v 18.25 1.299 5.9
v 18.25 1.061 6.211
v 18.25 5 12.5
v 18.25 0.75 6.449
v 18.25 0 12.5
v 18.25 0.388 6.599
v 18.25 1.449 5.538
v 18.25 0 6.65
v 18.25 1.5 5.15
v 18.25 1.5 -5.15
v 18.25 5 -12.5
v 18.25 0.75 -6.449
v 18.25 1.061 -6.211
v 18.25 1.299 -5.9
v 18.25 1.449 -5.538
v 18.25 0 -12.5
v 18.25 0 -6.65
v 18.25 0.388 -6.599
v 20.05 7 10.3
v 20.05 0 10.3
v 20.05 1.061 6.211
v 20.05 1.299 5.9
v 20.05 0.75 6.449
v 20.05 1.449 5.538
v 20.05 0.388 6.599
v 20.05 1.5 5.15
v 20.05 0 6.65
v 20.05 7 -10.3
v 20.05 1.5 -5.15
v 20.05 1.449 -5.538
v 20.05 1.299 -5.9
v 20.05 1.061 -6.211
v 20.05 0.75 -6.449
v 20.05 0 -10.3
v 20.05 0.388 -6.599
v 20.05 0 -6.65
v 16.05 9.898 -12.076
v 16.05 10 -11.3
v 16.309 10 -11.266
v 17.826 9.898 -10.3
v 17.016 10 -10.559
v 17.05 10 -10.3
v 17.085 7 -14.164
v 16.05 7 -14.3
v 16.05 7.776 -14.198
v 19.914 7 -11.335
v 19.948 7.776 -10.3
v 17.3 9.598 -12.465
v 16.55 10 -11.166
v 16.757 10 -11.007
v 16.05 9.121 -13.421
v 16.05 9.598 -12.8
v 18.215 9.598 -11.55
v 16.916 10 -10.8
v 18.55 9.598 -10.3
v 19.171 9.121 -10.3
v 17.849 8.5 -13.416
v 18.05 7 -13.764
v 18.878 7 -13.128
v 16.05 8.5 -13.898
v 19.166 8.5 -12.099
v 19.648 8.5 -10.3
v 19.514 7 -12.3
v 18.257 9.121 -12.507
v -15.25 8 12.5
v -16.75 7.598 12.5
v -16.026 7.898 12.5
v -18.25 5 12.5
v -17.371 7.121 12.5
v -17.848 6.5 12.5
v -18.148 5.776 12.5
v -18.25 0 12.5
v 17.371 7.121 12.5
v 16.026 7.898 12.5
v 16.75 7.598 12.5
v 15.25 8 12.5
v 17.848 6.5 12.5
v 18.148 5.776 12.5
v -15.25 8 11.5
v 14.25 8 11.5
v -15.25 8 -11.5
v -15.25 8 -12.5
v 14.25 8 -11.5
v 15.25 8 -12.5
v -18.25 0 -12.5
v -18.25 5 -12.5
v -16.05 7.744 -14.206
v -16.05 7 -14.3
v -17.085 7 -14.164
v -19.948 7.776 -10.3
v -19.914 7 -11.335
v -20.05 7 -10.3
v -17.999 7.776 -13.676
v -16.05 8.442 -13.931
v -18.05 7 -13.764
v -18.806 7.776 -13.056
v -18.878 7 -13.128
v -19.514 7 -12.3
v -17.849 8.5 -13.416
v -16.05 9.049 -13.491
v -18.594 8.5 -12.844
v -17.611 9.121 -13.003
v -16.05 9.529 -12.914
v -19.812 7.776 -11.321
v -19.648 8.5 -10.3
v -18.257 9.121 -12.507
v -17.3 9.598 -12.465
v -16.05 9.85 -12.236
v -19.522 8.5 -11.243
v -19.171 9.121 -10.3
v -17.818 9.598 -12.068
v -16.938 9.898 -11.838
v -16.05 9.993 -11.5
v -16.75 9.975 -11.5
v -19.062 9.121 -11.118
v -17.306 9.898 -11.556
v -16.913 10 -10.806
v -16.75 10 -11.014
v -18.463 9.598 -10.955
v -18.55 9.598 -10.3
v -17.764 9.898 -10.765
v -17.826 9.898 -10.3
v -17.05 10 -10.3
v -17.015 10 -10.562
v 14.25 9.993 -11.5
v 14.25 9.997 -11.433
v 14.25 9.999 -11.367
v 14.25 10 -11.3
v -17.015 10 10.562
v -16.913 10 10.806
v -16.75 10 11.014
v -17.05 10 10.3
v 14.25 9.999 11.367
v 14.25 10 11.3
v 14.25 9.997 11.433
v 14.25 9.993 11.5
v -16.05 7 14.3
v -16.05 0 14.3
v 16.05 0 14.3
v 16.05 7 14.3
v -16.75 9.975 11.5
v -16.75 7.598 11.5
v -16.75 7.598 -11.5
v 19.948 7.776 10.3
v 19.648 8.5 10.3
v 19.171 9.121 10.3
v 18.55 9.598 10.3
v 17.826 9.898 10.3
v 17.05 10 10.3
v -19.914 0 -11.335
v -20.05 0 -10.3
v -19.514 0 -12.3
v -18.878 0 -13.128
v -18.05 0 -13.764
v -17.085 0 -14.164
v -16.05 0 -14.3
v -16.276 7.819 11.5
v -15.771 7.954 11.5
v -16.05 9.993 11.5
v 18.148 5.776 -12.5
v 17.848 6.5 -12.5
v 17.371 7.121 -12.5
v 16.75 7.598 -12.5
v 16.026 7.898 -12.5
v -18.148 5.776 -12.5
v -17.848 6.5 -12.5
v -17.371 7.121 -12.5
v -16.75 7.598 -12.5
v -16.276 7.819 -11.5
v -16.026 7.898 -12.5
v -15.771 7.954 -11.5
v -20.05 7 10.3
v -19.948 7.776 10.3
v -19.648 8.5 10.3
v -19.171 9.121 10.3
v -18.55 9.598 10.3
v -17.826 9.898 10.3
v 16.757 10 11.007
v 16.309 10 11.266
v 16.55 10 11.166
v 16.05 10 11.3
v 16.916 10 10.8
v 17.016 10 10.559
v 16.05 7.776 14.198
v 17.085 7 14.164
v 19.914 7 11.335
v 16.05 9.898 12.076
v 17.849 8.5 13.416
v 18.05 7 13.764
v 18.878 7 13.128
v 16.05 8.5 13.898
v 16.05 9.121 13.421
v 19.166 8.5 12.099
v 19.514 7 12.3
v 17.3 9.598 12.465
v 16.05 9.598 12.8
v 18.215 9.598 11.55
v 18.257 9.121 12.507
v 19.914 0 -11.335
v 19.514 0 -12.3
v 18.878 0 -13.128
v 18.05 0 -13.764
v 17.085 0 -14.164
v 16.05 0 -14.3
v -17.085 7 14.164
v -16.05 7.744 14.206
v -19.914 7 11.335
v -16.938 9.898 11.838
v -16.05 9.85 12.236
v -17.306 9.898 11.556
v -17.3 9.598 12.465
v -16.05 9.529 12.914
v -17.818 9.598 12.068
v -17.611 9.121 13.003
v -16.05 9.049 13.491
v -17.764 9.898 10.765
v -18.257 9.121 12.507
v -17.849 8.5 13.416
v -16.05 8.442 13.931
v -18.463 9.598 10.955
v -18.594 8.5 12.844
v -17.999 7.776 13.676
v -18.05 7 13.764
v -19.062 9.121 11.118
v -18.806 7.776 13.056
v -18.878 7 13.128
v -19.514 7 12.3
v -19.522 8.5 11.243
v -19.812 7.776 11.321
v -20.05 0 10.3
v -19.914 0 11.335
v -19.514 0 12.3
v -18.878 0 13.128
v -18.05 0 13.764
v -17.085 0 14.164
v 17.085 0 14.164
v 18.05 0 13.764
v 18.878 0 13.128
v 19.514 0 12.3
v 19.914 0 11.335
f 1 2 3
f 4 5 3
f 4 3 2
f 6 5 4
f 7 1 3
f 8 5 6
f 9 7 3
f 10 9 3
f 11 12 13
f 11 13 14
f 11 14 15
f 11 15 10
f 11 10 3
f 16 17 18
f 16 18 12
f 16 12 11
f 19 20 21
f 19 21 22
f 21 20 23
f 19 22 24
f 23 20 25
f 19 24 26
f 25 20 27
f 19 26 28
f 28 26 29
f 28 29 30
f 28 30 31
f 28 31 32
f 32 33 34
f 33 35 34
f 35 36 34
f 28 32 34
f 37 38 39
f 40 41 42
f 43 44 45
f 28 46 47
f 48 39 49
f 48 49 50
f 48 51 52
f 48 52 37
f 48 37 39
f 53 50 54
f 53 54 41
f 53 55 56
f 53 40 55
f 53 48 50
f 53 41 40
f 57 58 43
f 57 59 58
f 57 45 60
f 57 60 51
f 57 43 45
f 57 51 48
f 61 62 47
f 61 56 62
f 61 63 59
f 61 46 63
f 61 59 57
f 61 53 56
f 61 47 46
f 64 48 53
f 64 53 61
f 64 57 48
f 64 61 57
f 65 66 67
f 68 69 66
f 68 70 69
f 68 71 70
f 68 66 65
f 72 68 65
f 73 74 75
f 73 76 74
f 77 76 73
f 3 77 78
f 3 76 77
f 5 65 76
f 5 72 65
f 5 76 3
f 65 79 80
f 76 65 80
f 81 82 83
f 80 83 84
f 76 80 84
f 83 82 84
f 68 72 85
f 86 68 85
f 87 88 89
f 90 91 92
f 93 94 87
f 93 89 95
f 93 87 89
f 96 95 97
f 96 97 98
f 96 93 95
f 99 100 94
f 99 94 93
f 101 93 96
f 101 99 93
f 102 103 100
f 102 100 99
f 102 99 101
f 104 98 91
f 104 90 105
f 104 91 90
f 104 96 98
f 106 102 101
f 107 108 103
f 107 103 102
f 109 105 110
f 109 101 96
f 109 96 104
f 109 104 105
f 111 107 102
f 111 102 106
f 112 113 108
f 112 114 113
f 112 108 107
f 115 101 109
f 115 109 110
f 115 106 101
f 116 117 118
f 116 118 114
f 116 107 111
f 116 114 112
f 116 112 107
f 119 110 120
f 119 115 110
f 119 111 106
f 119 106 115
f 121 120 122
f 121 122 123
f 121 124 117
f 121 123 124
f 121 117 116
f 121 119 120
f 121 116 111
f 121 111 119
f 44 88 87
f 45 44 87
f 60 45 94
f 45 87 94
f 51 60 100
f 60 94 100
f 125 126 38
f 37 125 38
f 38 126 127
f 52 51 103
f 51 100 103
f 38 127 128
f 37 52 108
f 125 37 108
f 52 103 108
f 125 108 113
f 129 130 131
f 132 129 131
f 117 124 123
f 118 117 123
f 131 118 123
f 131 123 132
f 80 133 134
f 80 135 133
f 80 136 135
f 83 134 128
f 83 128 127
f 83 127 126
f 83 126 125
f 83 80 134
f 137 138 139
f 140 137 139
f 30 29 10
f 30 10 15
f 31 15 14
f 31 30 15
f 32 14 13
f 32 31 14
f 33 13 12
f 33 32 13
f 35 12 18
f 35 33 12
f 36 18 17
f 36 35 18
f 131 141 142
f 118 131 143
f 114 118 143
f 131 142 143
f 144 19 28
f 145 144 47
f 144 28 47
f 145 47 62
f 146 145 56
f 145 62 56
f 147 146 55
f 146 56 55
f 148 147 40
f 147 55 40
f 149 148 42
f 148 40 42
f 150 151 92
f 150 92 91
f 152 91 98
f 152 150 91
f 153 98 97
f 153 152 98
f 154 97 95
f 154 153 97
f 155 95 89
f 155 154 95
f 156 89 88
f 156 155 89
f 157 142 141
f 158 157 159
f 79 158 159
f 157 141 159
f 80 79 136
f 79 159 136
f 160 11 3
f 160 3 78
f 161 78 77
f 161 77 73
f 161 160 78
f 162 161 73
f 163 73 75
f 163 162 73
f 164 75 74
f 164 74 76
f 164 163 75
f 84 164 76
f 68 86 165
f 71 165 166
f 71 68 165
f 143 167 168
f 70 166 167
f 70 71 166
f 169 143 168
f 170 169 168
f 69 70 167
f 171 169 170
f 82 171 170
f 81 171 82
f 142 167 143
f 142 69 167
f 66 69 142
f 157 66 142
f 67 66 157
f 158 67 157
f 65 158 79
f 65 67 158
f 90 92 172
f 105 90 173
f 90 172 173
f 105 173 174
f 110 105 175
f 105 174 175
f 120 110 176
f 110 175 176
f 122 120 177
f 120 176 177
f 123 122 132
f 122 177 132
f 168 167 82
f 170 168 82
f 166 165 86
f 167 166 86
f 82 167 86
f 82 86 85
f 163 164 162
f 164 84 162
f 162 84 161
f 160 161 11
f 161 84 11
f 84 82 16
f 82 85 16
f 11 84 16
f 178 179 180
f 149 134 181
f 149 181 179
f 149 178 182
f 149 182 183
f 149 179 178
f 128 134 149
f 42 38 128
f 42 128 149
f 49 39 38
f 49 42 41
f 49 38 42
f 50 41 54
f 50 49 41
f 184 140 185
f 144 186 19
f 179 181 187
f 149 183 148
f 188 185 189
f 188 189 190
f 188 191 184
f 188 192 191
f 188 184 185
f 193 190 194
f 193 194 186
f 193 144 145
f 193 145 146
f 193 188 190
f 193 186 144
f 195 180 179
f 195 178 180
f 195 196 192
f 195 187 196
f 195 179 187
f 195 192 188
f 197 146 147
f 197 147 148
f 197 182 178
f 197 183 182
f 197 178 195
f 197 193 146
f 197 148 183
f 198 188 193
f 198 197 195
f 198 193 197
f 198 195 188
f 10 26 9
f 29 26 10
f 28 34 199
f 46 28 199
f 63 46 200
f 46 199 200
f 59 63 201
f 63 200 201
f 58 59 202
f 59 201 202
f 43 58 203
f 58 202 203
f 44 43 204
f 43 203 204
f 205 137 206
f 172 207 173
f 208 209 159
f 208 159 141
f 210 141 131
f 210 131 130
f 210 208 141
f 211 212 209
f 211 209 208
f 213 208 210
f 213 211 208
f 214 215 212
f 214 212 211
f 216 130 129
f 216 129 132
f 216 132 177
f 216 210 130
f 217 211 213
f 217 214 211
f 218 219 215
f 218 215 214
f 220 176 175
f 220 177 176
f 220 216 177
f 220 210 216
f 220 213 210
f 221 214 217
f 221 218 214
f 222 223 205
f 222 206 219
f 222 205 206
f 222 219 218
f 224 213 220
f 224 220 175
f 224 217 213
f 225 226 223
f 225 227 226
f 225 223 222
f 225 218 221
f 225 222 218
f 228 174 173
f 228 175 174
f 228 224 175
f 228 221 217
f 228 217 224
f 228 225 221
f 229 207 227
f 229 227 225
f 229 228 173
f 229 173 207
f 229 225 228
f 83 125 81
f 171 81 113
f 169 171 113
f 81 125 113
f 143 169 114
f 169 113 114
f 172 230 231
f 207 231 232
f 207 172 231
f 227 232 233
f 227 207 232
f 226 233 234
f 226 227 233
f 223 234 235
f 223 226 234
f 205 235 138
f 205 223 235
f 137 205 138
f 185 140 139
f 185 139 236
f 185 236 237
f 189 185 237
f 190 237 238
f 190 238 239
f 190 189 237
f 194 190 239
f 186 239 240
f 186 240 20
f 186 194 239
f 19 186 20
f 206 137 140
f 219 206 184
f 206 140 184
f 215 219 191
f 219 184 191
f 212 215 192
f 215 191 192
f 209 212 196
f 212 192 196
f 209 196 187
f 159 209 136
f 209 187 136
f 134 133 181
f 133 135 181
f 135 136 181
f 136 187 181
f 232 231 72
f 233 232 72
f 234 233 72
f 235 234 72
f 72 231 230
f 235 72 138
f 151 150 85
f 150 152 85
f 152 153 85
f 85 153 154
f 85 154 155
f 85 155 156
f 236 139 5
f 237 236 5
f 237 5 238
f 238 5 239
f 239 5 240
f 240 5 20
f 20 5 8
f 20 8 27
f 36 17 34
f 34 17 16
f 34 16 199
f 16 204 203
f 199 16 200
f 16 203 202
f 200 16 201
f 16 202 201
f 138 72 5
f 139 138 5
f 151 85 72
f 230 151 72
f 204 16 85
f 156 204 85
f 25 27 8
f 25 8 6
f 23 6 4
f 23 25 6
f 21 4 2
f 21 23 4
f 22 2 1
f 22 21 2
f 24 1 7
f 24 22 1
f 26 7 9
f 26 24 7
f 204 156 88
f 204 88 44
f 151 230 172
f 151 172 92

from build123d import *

# Parameters (mm, degrees)
SKETCH1_W           = 40.1
SKETCH1_H           = 28.6
SKETCH1_W_2         = 36.5
SKETCH1_H_2         = 25
BOSS_EXTRUDE1_DEPTH = 8
SKETCH2_W           = 40.1
SKETCH2_H           = 28.6
SKETCH2_W_2         = 31
SKETCH2_H_2         = 23
BOSS_EXTRUDE2_DEPTH = 2
FILLET1_R           = 4
FILLET4_R           = 3
FILLET5_R           = 3
CUT_EXTRUDE1_REACH  = 45.732


with BuildPart() as part:
    # Sketch1 → Boss-Extrude1 (new body)
    with BuildSketch(Plane(origin=(0, 0, 0), x_dir=(1, 0, 0), z_dir=(0, 1, 0))):
        Rectangle(SKETCH1_W, SKETCH1_H)
        Rectangle(SKETCH1_W_2, SKETCH1_H_2, mode=Mode.SUBTRACT)
    extrude(amount=BOSS_EXTRUDE1_DEPTH)

    # Sketch2 → Boss-Extrude2 (add)
    with BuildSketch(Plane(origin=(0, 8, 0), x_dir=(1, 0, 0), z_dir=(0, 1, 0))):
        Rectangle(SKETCH2_W, SKETCH2_H)
        with Locations((-1.25, 0)):
            Rectangle(SKETCH2_W_2, SKETCH2_H_2, mode=Mode.SUBTRACT)
    extrude(amount=BOSS_EXTRUDE2_DEPTH)

    # Fillet1
    fillet1_edges = [part.edges().sort_by_distance(p)[0] for p in [
        (20.05, 5, 14.3),
        (-20.05, 5, 14.3),
        (-20.05, 5, -14.3),
        (20.05, 5, -14.3),
    ]]
    fillet(fillet1_edges, radius=FILLET1_R)

    # Fillet4
    # the kernel refuses this fillet: 3 mm, written as the material it takes off along each edge
    with BuildSketch(Plane(origin=(-20.05, 10, 10.3), x_dir=(1, 0, 0), z_dir=(0, 0, -1)), Plane(origin=(20.05, 10, -10.3), x_dir=(-1, 0, 0), z_dir=(0, 0, 1))) as fillet4_piece_1:
        with BuildLine():
            CenterArc((FILLET4_R, FILLET4_R), FILLET4_R, 180, 90)
            Line((0, FILLET4_R), (0, 0))
            Line((0, 0), (FILLET4_R, 0))
        make_face()
    extrude(amount=20.6, mode=Mode.SUBTRACT)
    with BuildSketch(Plane(origin=(-16.05, 10, -10.3), x_dir=(0, 0, -1), z_dir=(1, 0, 0))) as fillet4_piece_2:
        with BuildLine():
            CenterArc((4 - FILLET4_R, -FILLET4_R), FILLET4_R, 0, 90)
            Line((4, -FILLET4_R), (4, 0))
            Line((4, 0), (4 - FILLET4_R, 0))
        make_face()
    revolve(axis=Axis((-16.05, 10, -10.3), (0, 1, 0)), revolution_arc=90, mode=Mode.SUBTRACT)
    with BuildSketch(Plane(origin=(-16.05, 10, -14.3), x_dir=(0, 0, 1), z_dir=(1, 0, 0))) as fillet4_piece_3:
        with BuildLine():
            CenterArc((FILLET4_R, FILLET4_R), FILLET4_R, 180, 90)
            Line((0, FILLET4_R), (0, 0))
            Line((0, 0), (FILLET4_R, 0))
        make_face()
    extrude(amount=32.1, mode=Mode.SUBTRACT)
    with BuildSketch(Plane(origin=(16.05, 10, -10.3), x_dir=(0, 0, -1), z_dir=(-1, 0, 0))) as fillet4_piece_4:
        with BuildLine():
            CenterArc((4 - FILLET4_R, FILLET4_R), FILLET4_R, 270, 90)
            Line((4, FILLET4_R), (4, 0))
            Line((4, 0), (4 - FILLET4_R, 0))
        make_face()
    revolve(axis=Axis((16.05, 10, -10.3), (0, -1, 0)), revolution_arc=90, mode=Mode.SUBTRACT)
    with BuildSketch(Plane(origin=(16.05, 10, 10.3), x_dir=(0, 0, 1), z_dir=(-1, 0, 0))) as fillet4_piece_5:
        with BuildLine():
            CenterArc((4 - FILLET4_R, -FILLET4_R), FILLET4_R, 360, 90)
            Line((4, -FILLET4_R), (4, 0))
            Line((4, 0), (4 - FILLET4_R, 0))
        make_face()
    revolve(axis=Axis((16.05, 10, 10.3), (0, 1, 0)), revolution_arc=90, mode=Mode.SUBTRACT)
    with BuildSketch(Plane(origin=(16.05, 10, 14.3), x_dir=(0, -1, 0), z_dir=(-1, 0, 0))) as fillet4_piece_6:
        with BuildLine():
            CenterArc((FILLET4_R, -FILLET4_R), FILLET4_R, 90, 90)
            Line((0, -FILLET4_R), (0, 0))
            Line((0, 0), (FILLET4_R, 0))
        make_face()
    extrude(amount=32.1, mode=Mode.SUBTRACT)
    with BuildSketch(Plane(origin=(-16.05, 10, 10.3), x_dir=(0, 0, 1), z_dir=(1, 0, 0))) as fillet4_piece_7:
        with BuildLine():
            CenterArc((4 - FILLET4_R, FILLET4_R), FILLET4_R, 270, 90)
            Line((4, FILLET4_R), (4, 0))
            Line((4, 0), (4 - FILLET4_R, 0))
        make_face()
    revolve(axis=Axis((-16.05, 10, 10.3), (0, -1, 0)), revolution_arc=90, mode=Mode.SUBTRACT)

    # Fillet5
    # the kernel refuses this fillet: 3 mm, written as the material it adds along each edge
    with BuildSketch(Plane(origin=(-18.25, 8, 12.5), x_dir=(0, -1, 0), z_dir=(0, 0, -1))) as fillet5_piece_1_section:
        with BuildLine():
            CenterArc((FILLET5_R, -FILLET5_R), FILLET5_R, 90, 90)
            Line((0, -FILLET5_R), (0, 0))
            Line((0, 0), (FILLET5_R, 0))
        make_face()
    fillet5_piece_1 = extrude(amount=25, mode=Mode.PRIVATE)
    fillet5_piece_1 = split(fillet5_piece_1, bisect_by=Plane(origin=(-16.75, 7.23463982, 12), z_dir=(-1, 0, 0)), keep=Keep.TOP, mode=Mode.PRIVATE)
    fillet5_piece_1 = split(fillet5_piece_1, bisect_by=Plane(origin=(-17.756824707, 7.23463982, 11.5), z_dir=(0, 0, 1)), keep=Keep.TOP, mode=Mode.PRIVATE)
    add(fillet5_piece_1)
    with BuildSketch(Plane(origin=(-18.25, 8, 12.5), x_dir=(0, -1, 0), z_dir=(0, 0, -1))) as fillet5_piece_2_section:
        with BuildLine():
            CenterArc((FILLET5_R, -FILLET5_R), FILLET5_R, 90, 90)
            Line((0, -FILLET5_R), (0, 0))
            Line((0, 0), (FILLET5_R, 0))
        make_face()
    fillet5_piece_2 = extrude(amount=25, mode=Mode.PRIVATE)
    fillet5_piece_2 = split(fillet5_piece_2, bisect_by=Plane(origin=(-16.75, 7.927974855, 12), z_dir=(1, 0, 0)), keep=Keep.TOP, mode=Mode.PRIVATE)
    fillet5_piece_2 = split(fillet5_piece_2, bisect_by=Plane(origin=(-16.260247646, 7.927974855, 11.5), z_dir=(0, 0, 1)), keep=Keep.TOP, mode=Mode.PRIVATE)
    add(fillet5_piece_2)
    with BuildSketch(Plane(origin=(-18.25, 8, 12.5), x_dir=(0, -1, 0), z_dir=(0, 0, -1))) as fillet5_piece_3_section:
        with BuildLine():
            CenterArc((FILLET5_R, -FILLET5_R), FILLET5_R, 90, 90)
            Line((0, -FILLET5_R), (0, 0))
            Line((0, 0), (FILLET5_R, 0))
        make_face()
    fillet5_piece_3 = extrude(amount=25, mode=Mode.PRIVATE)
    fillet5_piece_3 = split(fillet5_piece_3, bisect_by=Plane(origin=(-16.75, 7.23463982, 0), z_dir=(-1, 0, 0)), keep=Keep.TOP, mode=Mode.PRIVATE)
    fillet5_piece_3 = split(fillet5_piece_3, bisect_by=Plane(origin=(-17.756824707, 7.23463982, 11.5), z_dir=(0, 0, -1)), keep=Keep.TOP, mode=Mode.PRIVATE)
    fillet5_piece_3 = split(fillet5_piece_3, bisect_by=Plane(origin=(-17.756824707, 7.23463982, -11.5), z_dir=(0, 0, 1)), keep=Keep.TOP, mode=Mode.PRIVATE)
    add(fillet5_piece_3)
    with BuildSketch(Plane(origin=(-18.25, 8, 12.5), x_dir=(0, -1, 0), z_dir=(0, 0, -1))) as fillet5_piece_4_section:
        with BuildLine():
            CenterArc((FILLET5_R, -FILLET5_R), FILLET5_R, 90, 90)
            Line((0, -FILLET5_R), (0, 0))
            Line((0, 0), (FILLET5_R, 0))
        make_face()
    fillet5_piece_4 = extrude(amount=25, mode=Mode.PRIVATE)
    fillet5_piece_4 = split(fillet5_piece_4, bisect_by=Plane(origin=(-16.75, 7.23463982, -12), z_dir=(-1, 0, 0)), keep=Keep.TOP, mode=Mode.PRIVATE)
    fillet5_piece_4 = split(fillet5_piece_4, bisect_by=Plane(origin=(-17.756824707, 7.23463982, -11.5), z_dir=(0, 0, -1)), keep=Keep.TOP, mode=Mode.PRIVATE)
    add(fillet5_piece_4)
    with BuildSketch(Plane(origin=(-18.25, 8, 12.5), x_dir=(0, -1, 0), z_dir=(0, 0, -1))) as fillet5_piece_5_section:
        with BuildLine():
            CenterArc((FILLET5_R, -FILLET5_R), FILLET5_R, 90, 90)
            Line((0, -FILLET5_R), (0, 0))
            Line((0, 0), (FILLET5_R, 0))
        make_face()
    fillet5_piece_5 = extrude(amount=25, mode=Mode.PRIVATE)
    fillet5_piece_5 = split(fillet5_piece_5, bisect_by=Plane(origin=(-16.75, 7.927974855, -12), z_dir=(1, 0, 0)), keep=Keep.TOP, mode=Mode.PRIVATE)
    fillet5_piece_5 = split(fillet5_piece_5, bisect_by=Plane(origin=(-16.260247646, 7.927974855, -11.5), z_dir=(0, 0, -1)), keep=Keep.TOP, mode=Mode.PRIVATE)
    add(fillet5_piece_5)
    with BuildSketch(Plane(origin=(18.25, 8, -12.5), x_dir=(0, -1, 0), z_dir=(0, 0, 1))) as fillet5_piece_6:
        with BuildLine():
            CenterArc((FILLET5_R, -FILLET5_R), FILLET5_R, 90, 90)
            Line((0, -FILLET5_R), (0, 0))
            Line((0, 0), (FILLET5_R, 0))
        make_face()
    extrude(amount=25)

    # Sketch3 → Cut-Extrude1 (cut, up to next)
    with BuildSketch(Plane(origin=(20.05, 0, 0), x_dir=(0, 0, -1), z_dir=(1, 0, 0)), mode=Mode.PRIVATE) as cut_extrude1_sk1:
        with BuildLine():
            Line((5.15, -1.5), (-5.15, -1.5))
            ThreePointArc((-5.15, -1.5), (-6.65, 0), (-5.15, 1.5))
            Line((-5.15, 1.5), (5.15, 1.5))
            ThreePointArc((5.15, 1.5), (6.65, 0), (5.15, -1.5))
        make_face()
    cut_extrude1_tool1 = extrude(cut_extrude1_sk1.sketch, amount=-CUT_EXTRUDE1_REACH, mode=Mode.PRIVATE) & part.part
    add(cut_extrude1_tool1.solids().sort_by_distance((20.05, 0, 0))[0], mode=Mode.SUBTRACT)


solid = part.part
